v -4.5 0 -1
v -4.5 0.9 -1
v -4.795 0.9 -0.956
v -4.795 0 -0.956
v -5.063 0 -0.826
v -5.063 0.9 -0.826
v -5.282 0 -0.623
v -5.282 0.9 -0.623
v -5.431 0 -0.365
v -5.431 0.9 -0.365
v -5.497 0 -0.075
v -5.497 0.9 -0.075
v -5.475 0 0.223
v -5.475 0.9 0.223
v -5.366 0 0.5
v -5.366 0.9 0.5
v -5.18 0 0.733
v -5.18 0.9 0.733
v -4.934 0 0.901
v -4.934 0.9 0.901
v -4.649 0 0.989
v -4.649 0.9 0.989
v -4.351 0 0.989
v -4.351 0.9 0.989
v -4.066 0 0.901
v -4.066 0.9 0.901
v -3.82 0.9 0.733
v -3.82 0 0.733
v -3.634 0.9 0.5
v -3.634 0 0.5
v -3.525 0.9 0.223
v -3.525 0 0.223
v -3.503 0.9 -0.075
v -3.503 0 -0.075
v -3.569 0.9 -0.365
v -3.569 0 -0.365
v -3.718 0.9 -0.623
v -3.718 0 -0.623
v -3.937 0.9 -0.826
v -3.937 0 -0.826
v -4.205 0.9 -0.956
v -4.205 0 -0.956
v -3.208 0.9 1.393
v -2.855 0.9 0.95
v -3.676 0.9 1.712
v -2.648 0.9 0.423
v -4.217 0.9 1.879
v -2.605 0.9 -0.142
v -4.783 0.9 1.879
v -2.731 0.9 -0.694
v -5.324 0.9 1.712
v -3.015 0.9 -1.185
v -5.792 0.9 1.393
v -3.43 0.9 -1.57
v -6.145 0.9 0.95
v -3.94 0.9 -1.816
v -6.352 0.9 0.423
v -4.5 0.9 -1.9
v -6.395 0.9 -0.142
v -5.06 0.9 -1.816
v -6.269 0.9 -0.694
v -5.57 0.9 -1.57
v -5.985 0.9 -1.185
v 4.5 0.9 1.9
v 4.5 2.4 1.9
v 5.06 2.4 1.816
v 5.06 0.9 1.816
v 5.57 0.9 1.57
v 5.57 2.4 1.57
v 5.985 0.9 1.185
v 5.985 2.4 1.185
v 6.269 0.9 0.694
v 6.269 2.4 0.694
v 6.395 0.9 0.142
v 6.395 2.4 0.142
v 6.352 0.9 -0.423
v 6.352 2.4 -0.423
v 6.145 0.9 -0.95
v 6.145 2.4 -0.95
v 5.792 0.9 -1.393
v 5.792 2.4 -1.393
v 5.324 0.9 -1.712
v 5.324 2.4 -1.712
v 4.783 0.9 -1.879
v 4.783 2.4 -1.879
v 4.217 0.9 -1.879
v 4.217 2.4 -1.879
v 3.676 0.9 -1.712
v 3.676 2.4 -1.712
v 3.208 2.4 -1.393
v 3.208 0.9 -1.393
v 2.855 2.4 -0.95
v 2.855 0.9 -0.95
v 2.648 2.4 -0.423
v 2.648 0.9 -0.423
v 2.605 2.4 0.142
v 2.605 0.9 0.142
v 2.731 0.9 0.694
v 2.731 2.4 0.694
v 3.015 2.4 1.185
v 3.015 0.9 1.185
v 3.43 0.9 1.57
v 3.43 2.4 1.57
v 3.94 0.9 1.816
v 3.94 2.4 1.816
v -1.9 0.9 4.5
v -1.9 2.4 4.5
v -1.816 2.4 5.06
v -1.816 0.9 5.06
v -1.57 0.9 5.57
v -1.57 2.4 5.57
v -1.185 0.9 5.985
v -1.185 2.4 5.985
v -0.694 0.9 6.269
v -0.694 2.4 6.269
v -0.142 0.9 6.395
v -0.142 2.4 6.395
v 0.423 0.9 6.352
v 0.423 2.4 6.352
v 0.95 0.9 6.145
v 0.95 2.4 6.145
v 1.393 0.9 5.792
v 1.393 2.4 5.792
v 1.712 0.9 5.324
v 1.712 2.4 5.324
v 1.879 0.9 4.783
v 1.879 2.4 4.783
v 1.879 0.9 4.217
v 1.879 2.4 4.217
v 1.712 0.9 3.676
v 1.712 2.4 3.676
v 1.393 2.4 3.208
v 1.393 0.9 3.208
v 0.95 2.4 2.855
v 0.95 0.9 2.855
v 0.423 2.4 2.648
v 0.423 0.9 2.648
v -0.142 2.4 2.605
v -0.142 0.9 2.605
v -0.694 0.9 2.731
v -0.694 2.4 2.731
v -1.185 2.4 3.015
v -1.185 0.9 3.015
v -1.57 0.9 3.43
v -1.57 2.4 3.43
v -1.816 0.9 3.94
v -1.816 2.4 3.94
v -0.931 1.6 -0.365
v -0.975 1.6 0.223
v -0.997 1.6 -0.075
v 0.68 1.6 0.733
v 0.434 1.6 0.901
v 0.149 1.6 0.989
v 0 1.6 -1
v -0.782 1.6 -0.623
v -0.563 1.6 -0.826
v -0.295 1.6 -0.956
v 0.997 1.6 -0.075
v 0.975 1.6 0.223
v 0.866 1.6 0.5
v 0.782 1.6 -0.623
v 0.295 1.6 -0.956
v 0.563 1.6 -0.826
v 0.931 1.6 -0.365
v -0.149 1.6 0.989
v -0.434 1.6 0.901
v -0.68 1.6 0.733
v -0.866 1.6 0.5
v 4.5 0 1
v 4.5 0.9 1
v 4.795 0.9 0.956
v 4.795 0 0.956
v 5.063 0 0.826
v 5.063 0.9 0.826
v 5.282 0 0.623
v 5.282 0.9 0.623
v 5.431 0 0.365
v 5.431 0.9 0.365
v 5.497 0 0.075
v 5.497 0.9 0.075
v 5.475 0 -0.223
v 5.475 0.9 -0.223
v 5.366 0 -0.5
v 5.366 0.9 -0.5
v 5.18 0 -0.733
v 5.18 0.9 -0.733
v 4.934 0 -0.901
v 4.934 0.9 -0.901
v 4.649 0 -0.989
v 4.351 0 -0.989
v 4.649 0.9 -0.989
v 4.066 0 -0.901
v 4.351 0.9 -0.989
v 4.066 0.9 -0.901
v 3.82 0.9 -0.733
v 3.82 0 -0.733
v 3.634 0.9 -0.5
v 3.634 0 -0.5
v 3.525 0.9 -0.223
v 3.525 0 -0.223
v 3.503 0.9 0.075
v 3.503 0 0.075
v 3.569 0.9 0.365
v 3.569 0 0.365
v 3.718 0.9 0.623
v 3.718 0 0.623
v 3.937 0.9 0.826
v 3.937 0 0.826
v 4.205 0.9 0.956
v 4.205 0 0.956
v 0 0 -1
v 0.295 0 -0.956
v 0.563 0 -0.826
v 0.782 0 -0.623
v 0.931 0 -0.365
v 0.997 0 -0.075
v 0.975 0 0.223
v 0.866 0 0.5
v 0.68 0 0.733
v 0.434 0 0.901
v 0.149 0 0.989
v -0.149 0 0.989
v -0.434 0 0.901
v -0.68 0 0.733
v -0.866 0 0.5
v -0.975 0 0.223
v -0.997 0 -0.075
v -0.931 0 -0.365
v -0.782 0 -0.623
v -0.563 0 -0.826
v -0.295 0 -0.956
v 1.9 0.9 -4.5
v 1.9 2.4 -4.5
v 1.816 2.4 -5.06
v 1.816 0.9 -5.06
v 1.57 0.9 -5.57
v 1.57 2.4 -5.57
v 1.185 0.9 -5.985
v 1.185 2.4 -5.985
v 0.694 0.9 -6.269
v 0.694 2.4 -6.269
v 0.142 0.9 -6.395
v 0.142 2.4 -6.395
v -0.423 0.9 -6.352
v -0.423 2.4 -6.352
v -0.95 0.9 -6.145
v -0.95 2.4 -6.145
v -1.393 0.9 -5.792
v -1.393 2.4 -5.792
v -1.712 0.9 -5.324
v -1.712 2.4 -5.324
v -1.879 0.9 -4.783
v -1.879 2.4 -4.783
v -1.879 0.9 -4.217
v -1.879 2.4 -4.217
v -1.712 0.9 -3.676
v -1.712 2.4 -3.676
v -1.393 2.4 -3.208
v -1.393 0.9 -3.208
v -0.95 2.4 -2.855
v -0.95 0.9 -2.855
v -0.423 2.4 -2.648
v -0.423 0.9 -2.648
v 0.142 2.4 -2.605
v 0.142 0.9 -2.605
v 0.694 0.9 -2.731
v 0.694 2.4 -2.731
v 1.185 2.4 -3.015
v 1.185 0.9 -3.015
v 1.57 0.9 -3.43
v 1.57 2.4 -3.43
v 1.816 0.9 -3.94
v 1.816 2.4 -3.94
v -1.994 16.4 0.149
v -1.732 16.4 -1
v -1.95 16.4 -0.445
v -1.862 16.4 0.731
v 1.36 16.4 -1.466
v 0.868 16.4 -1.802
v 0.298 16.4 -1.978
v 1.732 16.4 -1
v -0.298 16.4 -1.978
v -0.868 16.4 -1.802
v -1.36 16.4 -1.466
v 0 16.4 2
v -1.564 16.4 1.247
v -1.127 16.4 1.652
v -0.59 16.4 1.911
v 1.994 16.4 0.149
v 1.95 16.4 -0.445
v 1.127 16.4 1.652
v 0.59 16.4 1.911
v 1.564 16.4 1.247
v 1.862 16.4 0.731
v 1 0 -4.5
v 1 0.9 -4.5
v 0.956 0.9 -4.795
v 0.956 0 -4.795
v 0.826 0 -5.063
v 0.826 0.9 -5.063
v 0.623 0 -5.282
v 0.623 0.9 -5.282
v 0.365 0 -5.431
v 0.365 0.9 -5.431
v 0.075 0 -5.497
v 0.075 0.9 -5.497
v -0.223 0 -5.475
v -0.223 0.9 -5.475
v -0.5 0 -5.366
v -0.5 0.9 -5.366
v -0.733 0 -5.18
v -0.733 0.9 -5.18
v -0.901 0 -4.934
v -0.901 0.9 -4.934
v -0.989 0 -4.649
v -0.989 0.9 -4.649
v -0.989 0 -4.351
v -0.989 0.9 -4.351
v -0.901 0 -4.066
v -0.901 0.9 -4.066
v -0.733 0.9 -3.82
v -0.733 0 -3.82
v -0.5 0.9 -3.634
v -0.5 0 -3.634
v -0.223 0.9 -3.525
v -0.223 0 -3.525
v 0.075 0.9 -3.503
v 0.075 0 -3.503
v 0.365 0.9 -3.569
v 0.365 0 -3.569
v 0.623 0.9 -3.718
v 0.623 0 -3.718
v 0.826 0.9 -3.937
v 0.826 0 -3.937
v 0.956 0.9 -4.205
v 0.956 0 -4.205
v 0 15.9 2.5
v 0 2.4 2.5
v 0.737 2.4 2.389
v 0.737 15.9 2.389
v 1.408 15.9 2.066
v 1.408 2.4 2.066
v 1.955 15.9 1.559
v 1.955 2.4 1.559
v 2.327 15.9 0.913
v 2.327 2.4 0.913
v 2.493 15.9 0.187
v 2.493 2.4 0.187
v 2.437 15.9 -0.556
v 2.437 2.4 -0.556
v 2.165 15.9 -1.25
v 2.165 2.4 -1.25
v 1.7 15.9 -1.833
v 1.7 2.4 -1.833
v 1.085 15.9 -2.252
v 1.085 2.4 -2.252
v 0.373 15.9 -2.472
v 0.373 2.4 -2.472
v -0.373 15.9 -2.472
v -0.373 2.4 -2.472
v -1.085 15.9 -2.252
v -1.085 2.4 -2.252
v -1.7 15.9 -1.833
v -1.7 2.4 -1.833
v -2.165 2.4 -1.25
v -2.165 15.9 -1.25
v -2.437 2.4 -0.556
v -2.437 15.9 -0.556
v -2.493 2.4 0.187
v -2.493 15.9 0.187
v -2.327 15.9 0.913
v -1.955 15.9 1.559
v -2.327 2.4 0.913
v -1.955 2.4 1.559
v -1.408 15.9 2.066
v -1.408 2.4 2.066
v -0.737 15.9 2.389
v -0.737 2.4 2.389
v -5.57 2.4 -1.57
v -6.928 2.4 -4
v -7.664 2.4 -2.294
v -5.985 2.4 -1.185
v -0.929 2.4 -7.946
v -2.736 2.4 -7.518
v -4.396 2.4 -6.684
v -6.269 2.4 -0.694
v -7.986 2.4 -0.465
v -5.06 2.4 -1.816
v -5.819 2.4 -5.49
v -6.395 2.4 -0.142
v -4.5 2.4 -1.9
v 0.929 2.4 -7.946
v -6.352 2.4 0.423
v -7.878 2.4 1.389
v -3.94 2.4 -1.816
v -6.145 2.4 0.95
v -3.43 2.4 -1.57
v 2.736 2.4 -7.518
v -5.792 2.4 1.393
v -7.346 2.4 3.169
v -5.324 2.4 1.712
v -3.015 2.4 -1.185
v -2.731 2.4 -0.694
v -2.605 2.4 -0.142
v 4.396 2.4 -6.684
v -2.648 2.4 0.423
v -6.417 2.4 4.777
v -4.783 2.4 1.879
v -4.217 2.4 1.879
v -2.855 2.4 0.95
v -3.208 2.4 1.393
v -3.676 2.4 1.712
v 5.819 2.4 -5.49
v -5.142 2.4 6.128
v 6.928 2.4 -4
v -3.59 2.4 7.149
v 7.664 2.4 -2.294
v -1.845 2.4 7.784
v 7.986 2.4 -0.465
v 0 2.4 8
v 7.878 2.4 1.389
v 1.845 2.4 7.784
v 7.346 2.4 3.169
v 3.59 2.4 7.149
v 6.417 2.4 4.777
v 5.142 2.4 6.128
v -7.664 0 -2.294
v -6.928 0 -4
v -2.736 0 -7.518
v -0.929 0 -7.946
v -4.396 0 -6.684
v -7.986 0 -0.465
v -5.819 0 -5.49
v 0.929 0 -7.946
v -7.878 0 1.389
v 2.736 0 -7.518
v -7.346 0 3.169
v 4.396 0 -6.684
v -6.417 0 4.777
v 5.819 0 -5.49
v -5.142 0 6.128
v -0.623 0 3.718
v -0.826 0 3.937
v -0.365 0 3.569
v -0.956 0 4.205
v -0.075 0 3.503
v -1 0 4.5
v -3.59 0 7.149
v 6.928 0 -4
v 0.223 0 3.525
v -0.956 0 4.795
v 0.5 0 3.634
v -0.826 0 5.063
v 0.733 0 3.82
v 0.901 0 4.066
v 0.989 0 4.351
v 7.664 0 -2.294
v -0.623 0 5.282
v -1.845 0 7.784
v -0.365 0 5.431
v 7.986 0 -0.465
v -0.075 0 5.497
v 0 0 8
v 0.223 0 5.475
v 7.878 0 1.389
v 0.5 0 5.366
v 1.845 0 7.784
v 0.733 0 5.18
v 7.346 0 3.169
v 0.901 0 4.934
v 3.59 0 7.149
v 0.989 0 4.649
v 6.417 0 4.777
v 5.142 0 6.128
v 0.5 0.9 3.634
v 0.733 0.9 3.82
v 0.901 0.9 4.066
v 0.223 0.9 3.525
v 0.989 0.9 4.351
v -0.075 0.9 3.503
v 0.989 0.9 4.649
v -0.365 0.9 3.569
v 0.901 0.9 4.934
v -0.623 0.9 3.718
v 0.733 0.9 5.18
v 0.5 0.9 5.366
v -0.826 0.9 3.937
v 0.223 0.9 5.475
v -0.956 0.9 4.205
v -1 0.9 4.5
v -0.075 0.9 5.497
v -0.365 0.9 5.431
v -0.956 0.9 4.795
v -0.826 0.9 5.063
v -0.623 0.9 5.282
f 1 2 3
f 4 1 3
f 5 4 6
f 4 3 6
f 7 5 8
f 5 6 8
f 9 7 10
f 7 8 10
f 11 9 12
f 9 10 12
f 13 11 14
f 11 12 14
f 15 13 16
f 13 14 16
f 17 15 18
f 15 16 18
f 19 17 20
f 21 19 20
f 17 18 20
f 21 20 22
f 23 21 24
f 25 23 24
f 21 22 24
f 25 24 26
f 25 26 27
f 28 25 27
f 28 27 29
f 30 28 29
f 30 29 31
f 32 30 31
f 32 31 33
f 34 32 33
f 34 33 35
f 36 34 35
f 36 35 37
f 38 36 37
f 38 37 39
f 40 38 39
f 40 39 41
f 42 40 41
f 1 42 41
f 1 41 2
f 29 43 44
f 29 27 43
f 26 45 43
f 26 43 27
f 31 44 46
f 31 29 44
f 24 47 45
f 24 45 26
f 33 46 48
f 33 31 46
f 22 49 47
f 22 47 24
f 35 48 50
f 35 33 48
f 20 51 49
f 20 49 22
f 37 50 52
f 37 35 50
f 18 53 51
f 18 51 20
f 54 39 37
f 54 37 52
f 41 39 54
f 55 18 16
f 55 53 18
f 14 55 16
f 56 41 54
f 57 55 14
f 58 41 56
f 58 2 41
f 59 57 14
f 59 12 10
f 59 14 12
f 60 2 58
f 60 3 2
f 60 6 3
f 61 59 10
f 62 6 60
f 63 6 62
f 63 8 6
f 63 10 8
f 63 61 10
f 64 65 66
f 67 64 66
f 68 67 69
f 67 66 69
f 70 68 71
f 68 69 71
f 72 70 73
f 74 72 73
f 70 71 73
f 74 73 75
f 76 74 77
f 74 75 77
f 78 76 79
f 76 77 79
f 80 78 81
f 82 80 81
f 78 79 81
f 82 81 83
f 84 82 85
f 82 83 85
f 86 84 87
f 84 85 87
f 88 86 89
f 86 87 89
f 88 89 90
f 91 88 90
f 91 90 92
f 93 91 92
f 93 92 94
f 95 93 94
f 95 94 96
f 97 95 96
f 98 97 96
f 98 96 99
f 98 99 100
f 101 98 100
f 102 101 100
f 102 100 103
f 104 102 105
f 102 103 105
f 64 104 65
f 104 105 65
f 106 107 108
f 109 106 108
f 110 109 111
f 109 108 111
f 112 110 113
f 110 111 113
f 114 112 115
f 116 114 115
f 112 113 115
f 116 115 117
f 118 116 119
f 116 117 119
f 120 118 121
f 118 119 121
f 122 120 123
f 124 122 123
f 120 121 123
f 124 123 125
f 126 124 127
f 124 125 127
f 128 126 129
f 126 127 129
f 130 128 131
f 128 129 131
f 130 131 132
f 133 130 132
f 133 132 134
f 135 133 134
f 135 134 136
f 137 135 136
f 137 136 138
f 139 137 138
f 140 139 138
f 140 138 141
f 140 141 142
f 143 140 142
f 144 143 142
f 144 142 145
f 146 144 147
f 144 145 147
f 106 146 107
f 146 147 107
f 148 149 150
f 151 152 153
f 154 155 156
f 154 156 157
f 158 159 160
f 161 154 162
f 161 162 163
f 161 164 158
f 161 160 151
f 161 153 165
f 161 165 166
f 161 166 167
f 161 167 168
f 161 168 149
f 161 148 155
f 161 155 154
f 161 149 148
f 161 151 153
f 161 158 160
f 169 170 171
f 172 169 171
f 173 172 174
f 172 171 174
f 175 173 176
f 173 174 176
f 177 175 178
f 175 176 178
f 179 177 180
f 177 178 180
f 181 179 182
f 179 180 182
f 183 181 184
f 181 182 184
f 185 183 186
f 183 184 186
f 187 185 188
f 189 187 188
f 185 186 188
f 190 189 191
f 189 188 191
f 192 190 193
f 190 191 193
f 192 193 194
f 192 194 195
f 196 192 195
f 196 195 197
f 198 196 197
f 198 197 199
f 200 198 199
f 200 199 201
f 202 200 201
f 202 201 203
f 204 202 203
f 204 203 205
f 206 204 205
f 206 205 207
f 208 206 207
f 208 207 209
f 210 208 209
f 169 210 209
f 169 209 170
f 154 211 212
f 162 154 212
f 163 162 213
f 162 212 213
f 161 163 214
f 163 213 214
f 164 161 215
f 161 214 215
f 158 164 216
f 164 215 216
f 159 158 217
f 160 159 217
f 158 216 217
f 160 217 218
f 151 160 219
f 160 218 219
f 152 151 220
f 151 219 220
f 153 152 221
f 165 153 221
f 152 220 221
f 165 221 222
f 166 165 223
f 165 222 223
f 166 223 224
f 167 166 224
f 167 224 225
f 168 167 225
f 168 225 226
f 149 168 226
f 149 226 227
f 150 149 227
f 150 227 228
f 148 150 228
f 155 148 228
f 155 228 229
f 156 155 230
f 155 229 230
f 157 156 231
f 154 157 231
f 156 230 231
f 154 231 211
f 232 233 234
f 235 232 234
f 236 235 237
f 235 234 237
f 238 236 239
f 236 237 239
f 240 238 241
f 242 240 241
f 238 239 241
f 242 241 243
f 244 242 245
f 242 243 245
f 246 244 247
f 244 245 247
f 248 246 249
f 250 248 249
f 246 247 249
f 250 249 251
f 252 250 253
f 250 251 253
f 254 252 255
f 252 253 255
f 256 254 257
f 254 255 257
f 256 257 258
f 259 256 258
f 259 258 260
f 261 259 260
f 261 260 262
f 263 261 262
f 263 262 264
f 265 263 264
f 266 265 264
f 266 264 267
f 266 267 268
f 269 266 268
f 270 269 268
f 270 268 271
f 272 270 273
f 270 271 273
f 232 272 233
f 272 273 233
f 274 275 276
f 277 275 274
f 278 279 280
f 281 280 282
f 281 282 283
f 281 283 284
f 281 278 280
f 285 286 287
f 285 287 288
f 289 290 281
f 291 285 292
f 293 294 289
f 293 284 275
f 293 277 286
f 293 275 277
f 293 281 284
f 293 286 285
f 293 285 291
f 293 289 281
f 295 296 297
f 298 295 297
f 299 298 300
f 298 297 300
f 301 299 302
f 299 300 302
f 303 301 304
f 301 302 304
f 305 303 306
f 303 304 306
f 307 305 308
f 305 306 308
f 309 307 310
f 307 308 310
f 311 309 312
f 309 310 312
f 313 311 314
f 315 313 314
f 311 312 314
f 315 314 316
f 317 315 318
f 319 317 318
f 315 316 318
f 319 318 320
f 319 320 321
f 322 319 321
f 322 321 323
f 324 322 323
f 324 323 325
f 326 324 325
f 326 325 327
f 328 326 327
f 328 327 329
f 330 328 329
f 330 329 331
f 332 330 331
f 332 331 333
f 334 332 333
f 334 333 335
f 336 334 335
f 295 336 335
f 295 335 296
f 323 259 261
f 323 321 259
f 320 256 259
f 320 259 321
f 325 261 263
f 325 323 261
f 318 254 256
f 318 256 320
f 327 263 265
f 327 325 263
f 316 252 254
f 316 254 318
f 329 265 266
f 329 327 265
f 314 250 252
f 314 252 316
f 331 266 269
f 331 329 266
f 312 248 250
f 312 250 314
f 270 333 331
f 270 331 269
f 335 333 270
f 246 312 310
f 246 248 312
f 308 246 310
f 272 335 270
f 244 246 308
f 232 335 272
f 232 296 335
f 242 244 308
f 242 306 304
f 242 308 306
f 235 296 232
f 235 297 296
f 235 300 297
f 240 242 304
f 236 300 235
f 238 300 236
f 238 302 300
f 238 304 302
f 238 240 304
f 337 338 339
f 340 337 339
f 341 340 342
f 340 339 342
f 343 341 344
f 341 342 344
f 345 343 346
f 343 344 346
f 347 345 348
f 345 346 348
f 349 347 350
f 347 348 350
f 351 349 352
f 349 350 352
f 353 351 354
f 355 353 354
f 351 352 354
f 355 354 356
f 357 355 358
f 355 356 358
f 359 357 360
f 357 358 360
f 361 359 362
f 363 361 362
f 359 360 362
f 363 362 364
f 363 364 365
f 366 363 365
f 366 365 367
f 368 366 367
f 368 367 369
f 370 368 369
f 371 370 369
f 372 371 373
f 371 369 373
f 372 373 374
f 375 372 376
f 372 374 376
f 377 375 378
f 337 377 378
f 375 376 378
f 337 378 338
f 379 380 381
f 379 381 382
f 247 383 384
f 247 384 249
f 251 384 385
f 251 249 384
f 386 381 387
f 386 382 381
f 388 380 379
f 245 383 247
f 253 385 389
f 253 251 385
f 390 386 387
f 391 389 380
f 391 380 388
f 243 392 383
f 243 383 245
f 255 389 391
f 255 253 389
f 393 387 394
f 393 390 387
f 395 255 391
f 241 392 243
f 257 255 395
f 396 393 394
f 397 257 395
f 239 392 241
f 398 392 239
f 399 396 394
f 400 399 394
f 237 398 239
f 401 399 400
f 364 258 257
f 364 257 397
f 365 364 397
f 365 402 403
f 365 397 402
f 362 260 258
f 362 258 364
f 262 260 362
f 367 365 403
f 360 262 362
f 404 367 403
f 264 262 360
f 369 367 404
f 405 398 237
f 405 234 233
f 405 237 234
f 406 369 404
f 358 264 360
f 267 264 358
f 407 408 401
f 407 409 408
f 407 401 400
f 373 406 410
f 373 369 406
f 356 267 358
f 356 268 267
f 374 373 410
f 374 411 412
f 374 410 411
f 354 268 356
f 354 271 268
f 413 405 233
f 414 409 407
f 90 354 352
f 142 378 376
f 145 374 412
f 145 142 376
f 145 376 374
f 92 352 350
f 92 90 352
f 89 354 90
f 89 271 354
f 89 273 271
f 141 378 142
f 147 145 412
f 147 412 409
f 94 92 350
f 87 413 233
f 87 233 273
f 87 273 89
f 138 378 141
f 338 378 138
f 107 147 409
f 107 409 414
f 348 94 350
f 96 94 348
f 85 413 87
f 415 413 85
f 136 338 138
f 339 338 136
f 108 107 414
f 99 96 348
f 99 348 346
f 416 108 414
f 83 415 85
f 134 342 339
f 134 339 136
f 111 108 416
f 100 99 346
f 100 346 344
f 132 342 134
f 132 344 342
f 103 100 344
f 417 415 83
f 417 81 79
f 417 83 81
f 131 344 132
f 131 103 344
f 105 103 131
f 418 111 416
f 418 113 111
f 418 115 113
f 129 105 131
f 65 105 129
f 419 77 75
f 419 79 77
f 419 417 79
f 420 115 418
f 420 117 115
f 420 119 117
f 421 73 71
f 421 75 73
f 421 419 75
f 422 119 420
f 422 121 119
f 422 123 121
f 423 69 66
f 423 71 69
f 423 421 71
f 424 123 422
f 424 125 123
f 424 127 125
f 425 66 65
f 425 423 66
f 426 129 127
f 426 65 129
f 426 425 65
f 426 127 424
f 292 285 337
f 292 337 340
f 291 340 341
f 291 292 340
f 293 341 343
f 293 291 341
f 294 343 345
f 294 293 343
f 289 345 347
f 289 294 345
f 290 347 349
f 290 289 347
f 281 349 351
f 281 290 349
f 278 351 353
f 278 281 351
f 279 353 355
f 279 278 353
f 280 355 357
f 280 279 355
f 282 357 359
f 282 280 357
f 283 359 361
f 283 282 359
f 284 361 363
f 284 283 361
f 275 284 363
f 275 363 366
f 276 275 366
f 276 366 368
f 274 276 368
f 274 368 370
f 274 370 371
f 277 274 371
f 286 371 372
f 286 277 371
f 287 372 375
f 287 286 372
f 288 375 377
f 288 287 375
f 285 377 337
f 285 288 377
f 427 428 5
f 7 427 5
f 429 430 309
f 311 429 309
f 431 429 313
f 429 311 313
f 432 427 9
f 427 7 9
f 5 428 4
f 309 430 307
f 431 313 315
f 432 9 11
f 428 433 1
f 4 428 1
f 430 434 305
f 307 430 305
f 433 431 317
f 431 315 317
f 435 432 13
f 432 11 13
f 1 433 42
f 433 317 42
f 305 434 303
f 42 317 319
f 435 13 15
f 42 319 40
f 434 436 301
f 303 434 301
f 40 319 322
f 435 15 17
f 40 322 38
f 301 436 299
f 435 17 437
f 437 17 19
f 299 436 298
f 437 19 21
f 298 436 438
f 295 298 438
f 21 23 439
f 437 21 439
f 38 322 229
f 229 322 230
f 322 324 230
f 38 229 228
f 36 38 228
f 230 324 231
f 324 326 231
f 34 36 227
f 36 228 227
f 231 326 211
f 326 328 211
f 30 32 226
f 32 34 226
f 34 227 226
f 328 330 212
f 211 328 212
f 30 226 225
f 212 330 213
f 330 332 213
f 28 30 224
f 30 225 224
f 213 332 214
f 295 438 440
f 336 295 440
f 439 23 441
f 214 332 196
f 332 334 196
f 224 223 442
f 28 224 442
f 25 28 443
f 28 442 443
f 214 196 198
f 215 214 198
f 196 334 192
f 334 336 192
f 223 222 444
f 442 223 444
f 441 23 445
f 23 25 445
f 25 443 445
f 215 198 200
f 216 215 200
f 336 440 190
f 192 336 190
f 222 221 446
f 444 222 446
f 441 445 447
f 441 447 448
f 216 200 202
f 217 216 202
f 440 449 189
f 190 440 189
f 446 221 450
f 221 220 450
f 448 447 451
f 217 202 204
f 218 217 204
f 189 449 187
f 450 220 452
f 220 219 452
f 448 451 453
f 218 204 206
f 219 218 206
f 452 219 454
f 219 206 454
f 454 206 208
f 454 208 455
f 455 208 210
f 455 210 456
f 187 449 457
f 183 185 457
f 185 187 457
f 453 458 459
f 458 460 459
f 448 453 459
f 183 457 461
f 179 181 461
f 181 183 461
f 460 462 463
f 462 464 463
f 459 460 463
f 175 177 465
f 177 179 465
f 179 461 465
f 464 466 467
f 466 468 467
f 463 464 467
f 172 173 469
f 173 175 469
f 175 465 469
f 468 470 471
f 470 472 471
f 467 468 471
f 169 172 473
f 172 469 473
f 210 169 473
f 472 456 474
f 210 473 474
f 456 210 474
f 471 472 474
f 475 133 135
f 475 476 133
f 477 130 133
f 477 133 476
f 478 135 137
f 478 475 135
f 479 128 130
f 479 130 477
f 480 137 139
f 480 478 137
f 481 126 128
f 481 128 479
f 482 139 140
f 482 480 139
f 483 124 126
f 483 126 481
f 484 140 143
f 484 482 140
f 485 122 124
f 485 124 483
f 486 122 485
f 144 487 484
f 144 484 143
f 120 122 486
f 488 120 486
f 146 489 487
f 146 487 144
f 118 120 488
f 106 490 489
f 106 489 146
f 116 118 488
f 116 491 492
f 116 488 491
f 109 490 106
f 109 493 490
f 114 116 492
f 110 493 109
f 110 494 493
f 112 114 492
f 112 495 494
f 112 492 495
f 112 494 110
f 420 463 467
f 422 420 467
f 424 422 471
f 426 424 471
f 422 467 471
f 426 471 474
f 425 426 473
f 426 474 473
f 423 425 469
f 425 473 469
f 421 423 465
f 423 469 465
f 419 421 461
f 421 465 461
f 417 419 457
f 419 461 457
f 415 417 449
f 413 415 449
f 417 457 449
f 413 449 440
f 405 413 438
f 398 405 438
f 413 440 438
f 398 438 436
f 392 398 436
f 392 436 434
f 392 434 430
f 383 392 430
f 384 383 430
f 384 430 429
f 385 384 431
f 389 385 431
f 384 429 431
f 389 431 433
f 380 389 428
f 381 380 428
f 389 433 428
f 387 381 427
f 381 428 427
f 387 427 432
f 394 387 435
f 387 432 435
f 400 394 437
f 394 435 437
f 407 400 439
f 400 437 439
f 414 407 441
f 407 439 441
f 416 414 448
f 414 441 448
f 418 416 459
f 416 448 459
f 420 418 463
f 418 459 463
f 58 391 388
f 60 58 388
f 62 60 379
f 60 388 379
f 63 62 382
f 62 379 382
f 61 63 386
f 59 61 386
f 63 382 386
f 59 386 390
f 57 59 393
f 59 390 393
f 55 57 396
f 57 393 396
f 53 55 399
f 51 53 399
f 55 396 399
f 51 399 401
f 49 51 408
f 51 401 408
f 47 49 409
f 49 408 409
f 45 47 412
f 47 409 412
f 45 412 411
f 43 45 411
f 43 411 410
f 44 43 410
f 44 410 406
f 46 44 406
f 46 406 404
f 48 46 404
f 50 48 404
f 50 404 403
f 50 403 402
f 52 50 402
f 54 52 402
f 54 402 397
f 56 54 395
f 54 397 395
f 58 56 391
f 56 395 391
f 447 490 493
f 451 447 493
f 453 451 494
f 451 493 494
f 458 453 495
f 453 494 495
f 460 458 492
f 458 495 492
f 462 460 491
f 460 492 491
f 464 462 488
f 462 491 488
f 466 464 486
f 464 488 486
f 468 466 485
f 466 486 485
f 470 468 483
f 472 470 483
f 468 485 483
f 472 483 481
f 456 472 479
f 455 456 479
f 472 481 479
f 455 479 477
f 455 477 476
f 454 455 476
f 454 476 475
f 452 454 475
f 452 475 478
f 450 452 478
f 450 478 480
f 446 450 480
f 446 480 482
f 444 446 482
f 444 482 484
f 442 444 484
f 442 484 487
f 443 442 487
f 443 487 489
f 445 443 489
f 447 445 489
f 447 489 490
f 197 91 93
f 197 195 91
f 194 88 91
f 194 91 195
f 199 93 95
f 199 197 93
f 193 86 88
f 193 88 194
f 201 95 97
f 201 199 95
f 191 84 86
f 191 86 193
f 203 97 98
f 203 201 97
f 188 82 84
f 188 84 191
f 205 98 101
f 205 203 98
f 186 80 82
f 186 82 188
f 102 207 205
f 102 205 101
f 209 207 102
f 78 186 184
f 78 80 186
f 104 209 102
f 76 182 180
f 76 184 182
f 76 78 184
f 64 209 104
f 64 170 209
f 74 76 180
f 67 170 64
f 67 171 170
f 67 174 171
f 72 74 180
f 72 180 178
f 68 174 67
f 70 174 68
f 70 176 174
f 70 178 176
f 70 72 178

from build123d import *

# Parameters (mm, degrees)
ESQUISSE1_R                  = 8
BOSS_EXTRU_1_DEPTH           = 2.4
ESQUISSE2_R                  = 2.5
BOSS_EXTRU_2_DEPTH           = 14
ESQUISSE3_R                  = 1
ENL_V_MAT_EXTRU_1_DEPTH      = 7
ESQUISSE4_R                  = 1.9
ENL_V_MAT_EXTRU_2_DEPTH      = 1.5
R_P_TITION_CIRCULAIRE2_COUNT = 4
CHANFREIN1_SIZE              = 0.5
ESQUISSE5_R                  = 1
ENL_V_MAT_EXTRU_3_DEPTH      = 1.6


with BuildPart() as part:
    # Esquisse1 → Boss.-Extru.1 (new body)
    with BuildSketch(Plane(origin=(0, 0, 0), x_dir=(1, 0, 0), z_dir=(0, 1, 0))):
        with Locations(Location((0, 0, 0), (0, 0, 270))):
            Circle(ESQUISSE1_R)
    extrude(amount=BOSS_EXTRU_1_DEPTH)

    # Esquisse2 → Boss.-Extru.2 (add)
    with BuildSketch(Plane(origin=(0, 2.4, 0), x_dir=(1, 0, 0), z_dir=(0, 1, 0))):
        with Locations(Location((0, 0, 0), (0, 0, 270))):
            Circle(ESQUISSE2_R)
    extrude(amount=BOSS_EXTRU_2_DEPTH)

    # Esquisse3 → Enlèv. mat.-Extru.1 (cut)
    with BuildSketch(Plane(origin=(0, 2.4, 0), x_dir=(1, 0, 0), z_dir=(0, 1, 0))):
        with Locations(Location((4.5, 0, 0), (0, 0, 270))):
            Circle(ESQUISSE3_R)
    enl_v_mat_extru_1 = extrude(amount=-ENL_V_MAT_EXTRU_1_DEPTH, mode=Mode.SUBTRACT)

    # Esquisse4 → Enlèv. mat.-Extru.2 (cut)
    with BuildSketch(Plane(origin=(0, 2.4, 0), x_dir=(1, 0, 0), z_dir=(0, 1, 0))):
        with Locations(Location((4.5, 0, 0), (0, 0, 270))):
            Circle(ESQUISSE4_R)
    enl_v_mat_extru_2 = extrude(amount=-ENL_V_MAT_EXTRU_2_DEPTH, mode=Mode.SUBTRACT)

    # Répétition circulaire2: Enlèv. mat.-Extru.1, Enlèv. mat.-Extru.2 ×4 about axis
    r_p_tition_circulaire2_axis = Axis((0, 0, 0), (0, 1, 0))
    add([enl_v_mat_extru_1.rotate(r_p_tition_circulaire2_axis, i * 360 / R_P_TITION_CIRCULAIRE2_COUNT) for i in range(1, R_P_TITION_CIRCULAIRE2_COUNT)], mode=Mode.SUBTRACT)
    add([enl_v_mat_extru_2.rotate(r_p_tition_circulaire2_axis, i * 360 / R_P_TITION_CIRCULAIRE2_COUNT) for i in range(1, R_P_TITION_CIRCULAIRE2_COUNT)], mode=Mode.SUBTRACT)

    # Chanfrein1
    chanfrein1_edges = [part.edges().sort_by_distance(p)[0] for p in [
        (0, 16.4, -2.5),
    ]]
    chamfer(chanfrein1_edges, length=CHANFREIN1_SIZE)

    # Esquisse5 → Enlèv. mat.-Extru.3 (cut)
    with BuildSketch(Plane.XZ):
        with Locations(Location((0, 0, 0), (0, 0, 270))):
            Circle(ESQUISSE5_R)
    extrude(amount=-ENL_V_MAT_EXTRU_3_DEPTH, mode=Mode.SUBTRACT)


solid = part.part
